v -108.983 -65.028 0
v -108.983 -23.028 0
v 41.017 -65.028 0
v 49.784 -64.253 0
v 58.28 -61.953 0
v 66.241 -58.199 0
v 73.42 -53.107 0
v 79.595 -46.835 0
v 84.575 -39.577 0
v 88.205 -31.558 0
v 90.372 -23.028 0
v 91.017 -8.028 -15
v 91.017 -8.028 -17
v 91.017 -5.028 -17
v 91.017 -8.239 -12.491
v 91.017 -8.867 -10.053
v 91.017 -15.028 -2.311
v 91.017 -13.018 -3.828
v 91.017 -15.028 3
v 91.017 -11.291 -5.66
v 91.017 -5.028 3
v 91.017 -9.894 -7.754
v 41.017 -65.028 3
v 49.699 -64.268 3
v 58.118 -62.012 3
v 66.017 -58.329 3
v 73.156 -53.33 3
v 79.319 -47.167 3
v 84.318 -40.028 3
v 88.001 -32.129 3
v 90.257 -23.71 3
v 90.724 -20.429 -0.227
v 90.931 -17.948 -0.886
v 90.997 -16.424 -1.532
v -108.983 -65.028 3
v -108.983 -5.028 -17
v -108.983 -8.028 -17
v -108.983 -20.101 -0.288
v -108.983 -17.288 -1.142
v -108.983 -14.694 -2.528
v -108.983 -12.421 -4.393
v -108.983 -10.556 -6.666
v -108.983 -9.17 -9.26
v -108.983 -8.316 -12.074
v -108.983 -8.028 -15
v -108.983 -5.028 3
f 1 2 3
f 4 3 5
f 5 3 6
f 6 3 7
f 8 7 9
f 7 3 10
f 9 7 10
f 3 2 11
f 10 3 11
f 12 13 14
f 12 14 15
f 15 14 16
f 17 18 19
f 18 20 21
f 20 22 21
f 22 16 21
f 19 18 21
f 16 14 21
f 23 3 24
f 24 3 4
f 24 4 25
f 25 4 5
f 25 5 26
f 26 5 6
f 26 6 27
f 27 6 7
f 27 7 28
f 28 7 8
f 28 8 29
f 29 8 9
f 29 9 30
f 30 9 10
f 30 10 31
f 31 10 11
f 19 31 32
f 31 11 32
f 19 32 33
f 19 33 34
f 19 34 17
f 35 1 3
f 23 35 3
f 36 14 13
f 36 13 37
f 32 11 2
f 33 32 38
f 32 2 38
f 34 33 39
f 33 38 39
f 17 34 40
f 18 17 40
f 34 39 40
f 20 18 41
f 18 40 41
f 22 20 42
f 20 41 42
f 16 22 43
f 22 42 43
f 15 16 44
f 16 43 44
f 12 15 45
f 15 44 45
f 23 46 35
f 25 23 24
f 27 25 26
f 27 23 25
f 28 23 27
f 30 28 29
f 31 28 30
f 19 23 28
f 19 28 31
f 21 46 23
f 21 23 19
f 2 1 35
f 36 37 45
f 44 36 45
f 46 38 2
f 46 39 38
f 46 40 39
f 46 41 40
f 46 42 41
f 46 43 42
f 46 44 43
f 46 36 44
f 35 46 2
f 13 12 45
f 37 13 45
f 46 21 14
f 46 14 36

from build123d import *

# Parameters (mm, degrees)
F1_DEPTH = 3
F2_W     = 200
F2_H     = 17
F3_DEPTH = 3
F4_R     = 15


with BuildPart() as f1:
    # F0 (on Top) → F1 (new body)
    with BuildSketch(Plane.XY):
        with BuildLine():
            Line((91.016510874, -5.0278047089), (-108.983489126, -5.0278047089))
            Line((-108.983489126, -5.0278047089), (-108.983489126, -65.0278047089))
            Line((-108.983489126, -65.0278047089), (41.016510874, -65.0278047089))
            ThreePointArc((41.016510874, -65.0278047089), (76.3718499334, -50.3831437682), (91.016510874, -15.0278047089))
            Line((91.016510874, -15.0278047089), (91.016510874, -5.0278047089))
        make_face()
    extrude(amount=F1_DEPTH)

    # F2 (on face) → F3 (join)
    with BuildSketch(Plane(origin=(0, -5.0278047089, 0), x_dir=(-1, 0, 0), z_dir=(0, 1, 0))):
        with Locations((8.983489126, -8.5)):
            Rectangle(F2_W, F2_H)
    extrude(amount=-F3_DEPTH)

    # F4
    f4_edges = [f1.edges().sort_by_distance(p)[0] for p in [
        (-8.983489, -8.027805, 0),
    ]]
    fillet(f4_edges, radius=F4_R)


solid = f1.part
